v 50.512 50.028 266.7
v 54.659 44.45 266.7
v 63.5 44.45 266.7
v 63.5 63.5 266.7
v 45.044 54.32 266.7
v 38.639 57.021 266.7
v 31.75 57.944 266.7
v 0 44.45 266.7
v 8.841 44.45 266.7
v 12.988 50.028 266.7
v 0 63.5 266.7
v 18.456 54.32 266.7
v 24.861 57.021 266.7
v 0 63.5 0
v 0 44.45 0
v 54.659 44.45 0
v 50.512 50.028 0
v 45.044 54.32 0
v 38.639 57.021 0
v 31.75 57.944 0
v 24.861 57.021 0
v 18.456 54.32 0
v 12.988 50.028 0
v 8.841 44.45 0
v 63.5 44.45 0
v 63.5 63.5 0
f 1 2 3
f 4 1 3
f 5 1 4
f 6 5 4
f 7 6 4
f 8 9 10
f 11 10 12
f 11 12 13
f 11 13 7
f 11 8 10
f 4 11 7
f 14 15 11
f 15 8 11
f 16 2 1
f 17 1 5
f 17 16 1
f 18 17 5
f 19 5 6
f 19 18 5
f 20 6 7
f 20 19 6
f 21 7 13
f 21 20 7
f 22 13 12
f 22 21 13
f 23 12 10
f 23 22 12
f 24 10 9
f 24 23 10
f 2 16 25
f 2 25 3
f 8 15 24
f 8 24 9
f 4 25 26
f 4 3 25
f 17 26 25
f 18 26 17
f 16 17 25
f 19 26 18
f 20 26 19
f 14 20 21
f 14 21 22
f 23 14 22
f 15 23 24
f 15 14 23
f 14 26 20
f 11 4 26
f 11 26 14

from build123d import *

# Parameters (mm, degrees)
SKETCH2_W           = 63.5
SKETCH2_H           = 63.5
SKETCH2_R           = 26.19375
BOSS_EXTRUDE1_DEPTH = 279.4
BOSS_EXTRUDE2_START = -12.7
SKETCH3_W           = 88.9
SKETCH3_H           = 88.9
SKETCH3_R           = 26.19375
BOSS_EXTRUDE2_DEPTH = 12.7
SKETCH4_W           = 63.5
SKETCH4_H           = 63.5
SKETCH4_R           = 23.114
BOSS_EXTRUDE3_DEPTH = 12.7
SKETCH5_R           = 23.114
SKETCH5_R_2         = 19.05
BOSS_EXTRUDE4_DEPTH = 6.35
CUT_EXTRUDE4_START  = -76.2
CUT_EXTRUDE4_DEPTH  = 88.9


# Read off the part's stored shape, not the designer's step: Cut-Extrude4
with BuildPart() as part:
    # Sketch2 → Boss-Extrude1 (new body)
    with BuildSketch(Plane.XY):
        with Locations((31.75, 31.75)):
            Rectangle(SKETCH2_W, SKETCH2_H)
        with Locations((31.75, 31.75)):
            Circle(SKETCH2_R, mode=Mode.SUBTRACT)
    extrude(amount=BOSS_EXTRUDE1_DEPTH)

    # Sketch3 → Boss-Extrude2 (add)
    with BuildSketch(Plane.XY.offset(279.4).offset(BOSS_EXTRUDE2_START)):
        with Locations((31.75, 31.75)):
            Rectangle(SKETCH3_W, SKETCH3_H)
        with Locations((31.75, 31.75)):
            Circle(SKETCH3_R, mode=Mode.SUBTRACT)
    extrude(amount=BOSS_EXTRUDE2_DEPTH)

    # Sketch4 → Boss-Extrude3 (add)
    with BuildSketch(Plane(origin=(0, 0, 0), x_dir=(-1, 0, 0), z_dir=(0, 0, -1))):
        with Locations((-31.75, 31.75)):
            Rectangle(SKETCH4_W, SKETCH4_H)
        with Locations((-31.75, 31.75)):
            Circle(SKETCH4_R, mode=Mode.SUBTRACT)
    extrude(amount=BOSS_EXTRUDE3_DEPTH)


with BuildPart() as body_2:
    # Sketch5 → Boss-Extrude4 (new body)
    with BuildSketch(Plane(origin=(0, 0, -6.35), x_dir=(-1, 0, 0), z_dir=(0, 0, -1))):
        with Locations((-31.75, 31.75)):
            Circle(SKETCH5_R)
        with Locations((-31.75, 31.75)):
            Circle(SKETCH5_R_2, mode=Mode.SUBTRACT)
    extrude(amount=-BOSS_EXTRUDE4_DEPTH)


with BuildPart() as cut_extrude4_tool:
    # Cut-Extrude4 outline → Cut-Extrude4 (new body)
    with BuildSketch(Plane(origin=(63.5, 0, 0), x_dir=(0, 0, -1), z_dir=(1, 0, 0)).offset(CUT_EXTRUDE4_START)):
        Polygon((-266.7, 44.45), (-266.7, 76.2), (-279.4, 76.2), (-279.4, -12.7), (-266.7, -12.7), (-266.7, 0), (12.7, 0), (12.7, 63.5), (0, 63.5), (0, 44.45), align=None)
    extrude(amount=CUT_EXTRUDE4_DEPTH)


with BuildPart() as part_1:
    add(part.part)

    # Cut-Extrude4: cut by cut_extrude4_tool
    add(cut_extrude4_tool.part, mode=Mode.SUBTRACT)


with BuildPart() as body_2_1:
    add(body_2.part)

    # Cut-Extrude4: cut by cut_extrude4_tool
    add(cut_extrude4_tool.part, mode=Mode.SUBTRACT)


solid = part_1.part
